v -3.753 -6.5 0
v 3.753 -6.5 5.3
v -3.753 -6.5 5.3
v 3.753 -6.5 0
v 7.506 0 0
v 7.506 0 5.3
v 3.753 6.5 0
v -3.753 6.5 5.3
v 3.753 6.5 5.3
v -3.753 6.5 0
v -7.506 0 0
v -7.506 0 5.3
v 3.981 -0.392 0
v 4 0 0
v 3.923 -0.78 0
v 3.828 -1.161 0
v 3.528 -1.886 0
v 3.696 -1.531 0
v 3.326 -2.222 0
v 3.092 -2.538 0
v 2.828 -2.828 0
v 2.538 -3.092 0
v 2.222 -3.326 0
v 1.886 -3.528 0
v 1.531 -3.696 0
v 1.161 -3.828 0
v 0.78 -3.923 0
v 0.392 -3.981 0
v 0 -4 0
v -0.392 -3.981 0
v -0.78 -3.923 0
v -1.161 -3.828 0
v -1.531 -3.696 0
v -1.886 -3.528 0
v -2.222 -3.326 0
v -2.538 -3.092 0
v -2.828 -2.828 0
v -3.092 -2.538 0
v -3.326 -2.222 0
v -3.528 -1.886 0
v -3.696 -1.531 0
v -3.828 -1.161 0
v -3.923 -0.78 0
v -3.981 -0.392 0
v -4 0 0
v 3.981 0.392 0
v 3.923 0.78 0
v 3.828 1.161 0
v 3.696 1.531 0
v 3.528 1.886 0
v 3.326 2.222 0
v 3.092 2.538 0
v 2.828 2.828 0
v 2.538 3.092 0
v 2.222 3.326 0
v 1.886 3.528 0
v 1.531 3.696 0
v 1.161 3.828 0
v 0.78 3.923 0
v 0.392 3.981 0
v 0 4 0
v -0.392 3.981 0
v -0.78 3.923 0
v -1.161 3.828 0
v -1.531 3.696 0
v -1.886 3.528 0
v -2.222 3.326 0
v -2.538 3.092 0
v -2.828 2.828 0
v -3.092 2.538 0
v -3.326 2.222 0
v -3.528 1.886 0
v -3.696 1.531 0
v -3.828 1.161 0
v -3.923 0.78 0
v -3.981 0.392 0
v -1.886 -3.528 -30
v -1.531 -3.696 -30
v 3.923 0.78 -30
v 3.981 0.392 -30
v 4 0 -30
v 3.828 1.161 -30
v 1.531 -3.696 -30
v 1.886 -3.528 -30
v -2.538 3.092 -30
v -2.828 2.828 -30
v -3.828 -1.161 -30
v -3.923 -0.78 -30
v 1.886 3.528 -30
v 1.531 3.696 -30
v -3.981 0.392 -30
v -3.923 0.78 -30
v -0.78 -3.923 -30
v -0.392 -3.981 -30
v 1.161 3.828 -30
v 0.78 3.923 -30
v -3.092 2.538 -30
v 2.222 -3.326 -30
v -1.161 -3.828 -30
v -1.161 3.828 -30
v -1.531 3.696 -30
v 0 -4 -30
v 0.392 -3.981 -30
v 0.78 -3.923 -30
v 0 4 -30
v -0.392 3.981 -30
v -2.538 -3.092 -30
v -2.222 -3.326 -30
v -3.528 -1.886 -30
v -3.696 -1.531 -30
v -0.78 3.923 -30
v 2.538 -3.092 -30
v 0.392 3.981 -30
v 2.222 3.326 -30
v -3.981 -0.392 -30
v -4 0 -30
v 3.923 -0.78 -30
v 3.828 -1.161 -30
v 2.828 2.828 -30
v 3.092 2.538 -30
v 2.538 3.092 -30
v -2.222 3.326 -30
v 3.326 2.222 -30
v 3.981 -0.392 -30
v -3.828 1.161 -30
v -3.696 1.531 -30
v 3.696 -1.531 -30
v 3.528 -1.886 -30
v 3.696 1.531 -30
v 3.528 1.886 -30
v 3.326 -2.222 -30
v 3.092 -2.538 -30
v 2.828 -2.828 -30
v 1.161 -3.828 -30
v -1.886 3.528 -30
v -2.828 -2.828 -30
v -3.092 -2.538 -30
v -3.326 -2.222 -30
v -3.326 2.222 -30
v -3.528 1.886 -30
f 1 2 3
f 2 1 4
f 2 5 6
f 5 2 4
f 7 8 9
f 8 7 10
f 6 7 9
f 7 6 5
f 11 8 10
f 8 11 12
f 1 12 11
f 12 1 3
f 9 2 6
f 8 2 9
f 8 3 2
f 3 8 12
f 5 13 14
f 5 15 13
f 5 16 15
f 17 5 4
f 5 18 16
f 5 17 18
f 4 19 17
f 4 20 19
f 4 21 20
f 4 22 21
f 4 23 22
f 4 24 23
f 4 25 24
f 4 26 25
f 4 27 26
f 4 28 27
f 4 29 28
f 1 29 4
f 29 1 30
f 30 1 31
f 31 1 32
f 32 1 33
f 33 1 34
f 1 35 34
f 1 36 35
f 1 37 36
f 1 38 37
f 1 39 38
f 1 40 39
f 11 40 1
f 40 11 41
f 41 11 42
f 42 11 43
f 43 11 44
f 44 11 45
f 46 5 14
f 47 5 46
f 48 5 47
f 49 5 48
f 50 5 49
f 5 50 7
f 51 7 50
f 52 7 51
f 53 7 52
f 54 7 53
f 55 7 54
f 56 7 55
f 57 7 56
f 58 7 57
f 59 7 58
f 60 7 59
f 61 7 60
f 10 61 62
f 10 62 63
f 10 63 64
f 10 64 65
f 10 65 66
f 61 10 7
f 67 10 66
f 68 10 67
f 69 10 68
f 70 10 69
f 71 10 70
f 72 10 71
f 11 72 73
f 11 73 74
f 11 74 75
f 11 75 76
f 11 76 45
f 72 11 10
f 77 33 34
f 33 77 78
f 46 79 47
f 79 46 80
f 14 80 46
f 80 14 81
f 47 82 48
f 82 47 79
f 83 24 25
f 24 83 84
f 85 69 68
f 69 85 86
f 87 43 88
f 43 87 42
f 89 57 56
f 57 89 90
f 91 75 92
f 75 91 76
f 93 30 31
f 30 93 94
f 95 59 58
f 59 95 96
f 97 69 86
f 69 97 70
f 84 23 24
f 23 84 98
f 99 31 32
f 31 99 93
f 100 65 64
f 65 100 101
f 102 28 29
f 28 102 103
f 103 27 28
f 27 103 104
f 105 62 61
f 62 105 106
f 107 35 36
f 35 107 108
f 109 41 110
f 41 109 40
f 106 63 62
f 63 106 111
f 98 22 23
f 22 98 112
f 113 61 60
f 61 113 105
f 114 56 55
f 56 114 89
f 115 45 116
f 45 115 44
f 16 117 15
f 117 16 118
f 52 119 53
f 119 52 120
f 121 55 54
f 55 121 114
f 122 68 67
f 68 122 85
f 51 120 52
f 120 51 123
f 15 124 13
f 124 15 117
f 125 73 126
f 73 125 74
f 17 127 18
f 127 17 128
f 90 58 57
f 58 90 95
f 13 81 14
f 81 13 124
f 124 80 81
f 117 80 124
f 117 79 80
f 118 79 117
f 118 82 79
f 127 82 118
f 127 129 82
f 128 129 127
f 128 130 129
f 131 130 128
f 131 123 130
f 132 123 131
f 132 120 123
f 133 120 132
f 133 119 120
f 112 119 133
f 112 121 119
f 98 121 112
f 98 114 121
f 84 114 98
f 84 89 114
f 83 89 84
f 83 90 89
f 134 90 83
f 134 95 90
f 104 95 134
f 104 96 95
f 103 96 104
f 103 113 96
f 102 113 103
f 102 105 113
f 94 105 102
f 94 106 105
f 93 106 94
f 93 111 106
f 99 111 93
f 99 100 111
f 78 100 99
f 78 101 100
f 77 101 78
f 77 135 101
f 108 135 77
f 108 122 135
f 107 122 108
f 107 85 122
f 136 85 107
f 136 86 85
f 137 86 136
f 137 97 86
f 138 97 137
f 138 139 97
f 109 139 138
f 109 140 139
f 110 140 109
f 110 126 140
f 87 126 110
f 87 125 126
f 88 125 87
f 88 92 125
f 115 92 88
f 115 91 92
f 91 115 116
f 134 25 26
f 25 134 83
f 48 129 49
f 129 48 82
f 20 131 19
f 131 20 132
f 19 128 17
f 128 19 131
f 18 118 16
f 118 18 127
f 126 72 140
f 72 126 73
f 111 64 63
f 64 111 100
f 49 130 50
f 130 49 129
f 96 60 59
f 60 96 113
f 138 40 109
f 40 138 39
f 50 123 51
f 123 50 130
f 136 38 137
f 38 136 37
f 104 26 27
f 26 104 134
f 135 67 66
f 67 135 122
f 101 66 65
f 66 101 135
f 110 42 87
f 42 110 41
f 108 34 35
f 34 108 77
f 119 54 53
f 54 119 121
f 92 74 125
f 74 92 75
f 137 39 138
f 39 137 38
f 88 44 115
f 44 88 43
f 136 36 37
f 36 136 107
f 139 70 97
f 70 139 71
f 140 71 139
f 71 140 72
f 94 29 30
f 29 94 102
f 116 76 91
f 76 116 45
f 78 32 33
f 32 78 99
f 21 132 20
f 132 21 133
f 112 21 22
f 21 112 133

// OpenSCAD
// M8 hex bolt (thread omitted)
// Dimensions per request:
// - Head: across flats 13 mm, height 5.3 mm
// - Shank: diameter 8 mm, length 30 mm
// - Head base at z=0, shank extends to negative z

af = 13;            // across-flats of hex head (mm)
head_h = 5.3;       // head height (mm)
shank_d = 8;        // shank diameter (mm)
shank_l = 30;       // shank length (mm)

r_hex = af / (2 * cos(30));  // radius for hex prism so AF = 13 mm

union() {
  // Hex head: z from 0 to +head_h
  cylinder(h = head_h, r = r_hex, $fn = 6);

  // Shank: z from -shank_l to 0
  translate([0, 0, -shank_l])
    cylinder(h = shank_l, r = shank_d / 2, $fn = 64);
}
